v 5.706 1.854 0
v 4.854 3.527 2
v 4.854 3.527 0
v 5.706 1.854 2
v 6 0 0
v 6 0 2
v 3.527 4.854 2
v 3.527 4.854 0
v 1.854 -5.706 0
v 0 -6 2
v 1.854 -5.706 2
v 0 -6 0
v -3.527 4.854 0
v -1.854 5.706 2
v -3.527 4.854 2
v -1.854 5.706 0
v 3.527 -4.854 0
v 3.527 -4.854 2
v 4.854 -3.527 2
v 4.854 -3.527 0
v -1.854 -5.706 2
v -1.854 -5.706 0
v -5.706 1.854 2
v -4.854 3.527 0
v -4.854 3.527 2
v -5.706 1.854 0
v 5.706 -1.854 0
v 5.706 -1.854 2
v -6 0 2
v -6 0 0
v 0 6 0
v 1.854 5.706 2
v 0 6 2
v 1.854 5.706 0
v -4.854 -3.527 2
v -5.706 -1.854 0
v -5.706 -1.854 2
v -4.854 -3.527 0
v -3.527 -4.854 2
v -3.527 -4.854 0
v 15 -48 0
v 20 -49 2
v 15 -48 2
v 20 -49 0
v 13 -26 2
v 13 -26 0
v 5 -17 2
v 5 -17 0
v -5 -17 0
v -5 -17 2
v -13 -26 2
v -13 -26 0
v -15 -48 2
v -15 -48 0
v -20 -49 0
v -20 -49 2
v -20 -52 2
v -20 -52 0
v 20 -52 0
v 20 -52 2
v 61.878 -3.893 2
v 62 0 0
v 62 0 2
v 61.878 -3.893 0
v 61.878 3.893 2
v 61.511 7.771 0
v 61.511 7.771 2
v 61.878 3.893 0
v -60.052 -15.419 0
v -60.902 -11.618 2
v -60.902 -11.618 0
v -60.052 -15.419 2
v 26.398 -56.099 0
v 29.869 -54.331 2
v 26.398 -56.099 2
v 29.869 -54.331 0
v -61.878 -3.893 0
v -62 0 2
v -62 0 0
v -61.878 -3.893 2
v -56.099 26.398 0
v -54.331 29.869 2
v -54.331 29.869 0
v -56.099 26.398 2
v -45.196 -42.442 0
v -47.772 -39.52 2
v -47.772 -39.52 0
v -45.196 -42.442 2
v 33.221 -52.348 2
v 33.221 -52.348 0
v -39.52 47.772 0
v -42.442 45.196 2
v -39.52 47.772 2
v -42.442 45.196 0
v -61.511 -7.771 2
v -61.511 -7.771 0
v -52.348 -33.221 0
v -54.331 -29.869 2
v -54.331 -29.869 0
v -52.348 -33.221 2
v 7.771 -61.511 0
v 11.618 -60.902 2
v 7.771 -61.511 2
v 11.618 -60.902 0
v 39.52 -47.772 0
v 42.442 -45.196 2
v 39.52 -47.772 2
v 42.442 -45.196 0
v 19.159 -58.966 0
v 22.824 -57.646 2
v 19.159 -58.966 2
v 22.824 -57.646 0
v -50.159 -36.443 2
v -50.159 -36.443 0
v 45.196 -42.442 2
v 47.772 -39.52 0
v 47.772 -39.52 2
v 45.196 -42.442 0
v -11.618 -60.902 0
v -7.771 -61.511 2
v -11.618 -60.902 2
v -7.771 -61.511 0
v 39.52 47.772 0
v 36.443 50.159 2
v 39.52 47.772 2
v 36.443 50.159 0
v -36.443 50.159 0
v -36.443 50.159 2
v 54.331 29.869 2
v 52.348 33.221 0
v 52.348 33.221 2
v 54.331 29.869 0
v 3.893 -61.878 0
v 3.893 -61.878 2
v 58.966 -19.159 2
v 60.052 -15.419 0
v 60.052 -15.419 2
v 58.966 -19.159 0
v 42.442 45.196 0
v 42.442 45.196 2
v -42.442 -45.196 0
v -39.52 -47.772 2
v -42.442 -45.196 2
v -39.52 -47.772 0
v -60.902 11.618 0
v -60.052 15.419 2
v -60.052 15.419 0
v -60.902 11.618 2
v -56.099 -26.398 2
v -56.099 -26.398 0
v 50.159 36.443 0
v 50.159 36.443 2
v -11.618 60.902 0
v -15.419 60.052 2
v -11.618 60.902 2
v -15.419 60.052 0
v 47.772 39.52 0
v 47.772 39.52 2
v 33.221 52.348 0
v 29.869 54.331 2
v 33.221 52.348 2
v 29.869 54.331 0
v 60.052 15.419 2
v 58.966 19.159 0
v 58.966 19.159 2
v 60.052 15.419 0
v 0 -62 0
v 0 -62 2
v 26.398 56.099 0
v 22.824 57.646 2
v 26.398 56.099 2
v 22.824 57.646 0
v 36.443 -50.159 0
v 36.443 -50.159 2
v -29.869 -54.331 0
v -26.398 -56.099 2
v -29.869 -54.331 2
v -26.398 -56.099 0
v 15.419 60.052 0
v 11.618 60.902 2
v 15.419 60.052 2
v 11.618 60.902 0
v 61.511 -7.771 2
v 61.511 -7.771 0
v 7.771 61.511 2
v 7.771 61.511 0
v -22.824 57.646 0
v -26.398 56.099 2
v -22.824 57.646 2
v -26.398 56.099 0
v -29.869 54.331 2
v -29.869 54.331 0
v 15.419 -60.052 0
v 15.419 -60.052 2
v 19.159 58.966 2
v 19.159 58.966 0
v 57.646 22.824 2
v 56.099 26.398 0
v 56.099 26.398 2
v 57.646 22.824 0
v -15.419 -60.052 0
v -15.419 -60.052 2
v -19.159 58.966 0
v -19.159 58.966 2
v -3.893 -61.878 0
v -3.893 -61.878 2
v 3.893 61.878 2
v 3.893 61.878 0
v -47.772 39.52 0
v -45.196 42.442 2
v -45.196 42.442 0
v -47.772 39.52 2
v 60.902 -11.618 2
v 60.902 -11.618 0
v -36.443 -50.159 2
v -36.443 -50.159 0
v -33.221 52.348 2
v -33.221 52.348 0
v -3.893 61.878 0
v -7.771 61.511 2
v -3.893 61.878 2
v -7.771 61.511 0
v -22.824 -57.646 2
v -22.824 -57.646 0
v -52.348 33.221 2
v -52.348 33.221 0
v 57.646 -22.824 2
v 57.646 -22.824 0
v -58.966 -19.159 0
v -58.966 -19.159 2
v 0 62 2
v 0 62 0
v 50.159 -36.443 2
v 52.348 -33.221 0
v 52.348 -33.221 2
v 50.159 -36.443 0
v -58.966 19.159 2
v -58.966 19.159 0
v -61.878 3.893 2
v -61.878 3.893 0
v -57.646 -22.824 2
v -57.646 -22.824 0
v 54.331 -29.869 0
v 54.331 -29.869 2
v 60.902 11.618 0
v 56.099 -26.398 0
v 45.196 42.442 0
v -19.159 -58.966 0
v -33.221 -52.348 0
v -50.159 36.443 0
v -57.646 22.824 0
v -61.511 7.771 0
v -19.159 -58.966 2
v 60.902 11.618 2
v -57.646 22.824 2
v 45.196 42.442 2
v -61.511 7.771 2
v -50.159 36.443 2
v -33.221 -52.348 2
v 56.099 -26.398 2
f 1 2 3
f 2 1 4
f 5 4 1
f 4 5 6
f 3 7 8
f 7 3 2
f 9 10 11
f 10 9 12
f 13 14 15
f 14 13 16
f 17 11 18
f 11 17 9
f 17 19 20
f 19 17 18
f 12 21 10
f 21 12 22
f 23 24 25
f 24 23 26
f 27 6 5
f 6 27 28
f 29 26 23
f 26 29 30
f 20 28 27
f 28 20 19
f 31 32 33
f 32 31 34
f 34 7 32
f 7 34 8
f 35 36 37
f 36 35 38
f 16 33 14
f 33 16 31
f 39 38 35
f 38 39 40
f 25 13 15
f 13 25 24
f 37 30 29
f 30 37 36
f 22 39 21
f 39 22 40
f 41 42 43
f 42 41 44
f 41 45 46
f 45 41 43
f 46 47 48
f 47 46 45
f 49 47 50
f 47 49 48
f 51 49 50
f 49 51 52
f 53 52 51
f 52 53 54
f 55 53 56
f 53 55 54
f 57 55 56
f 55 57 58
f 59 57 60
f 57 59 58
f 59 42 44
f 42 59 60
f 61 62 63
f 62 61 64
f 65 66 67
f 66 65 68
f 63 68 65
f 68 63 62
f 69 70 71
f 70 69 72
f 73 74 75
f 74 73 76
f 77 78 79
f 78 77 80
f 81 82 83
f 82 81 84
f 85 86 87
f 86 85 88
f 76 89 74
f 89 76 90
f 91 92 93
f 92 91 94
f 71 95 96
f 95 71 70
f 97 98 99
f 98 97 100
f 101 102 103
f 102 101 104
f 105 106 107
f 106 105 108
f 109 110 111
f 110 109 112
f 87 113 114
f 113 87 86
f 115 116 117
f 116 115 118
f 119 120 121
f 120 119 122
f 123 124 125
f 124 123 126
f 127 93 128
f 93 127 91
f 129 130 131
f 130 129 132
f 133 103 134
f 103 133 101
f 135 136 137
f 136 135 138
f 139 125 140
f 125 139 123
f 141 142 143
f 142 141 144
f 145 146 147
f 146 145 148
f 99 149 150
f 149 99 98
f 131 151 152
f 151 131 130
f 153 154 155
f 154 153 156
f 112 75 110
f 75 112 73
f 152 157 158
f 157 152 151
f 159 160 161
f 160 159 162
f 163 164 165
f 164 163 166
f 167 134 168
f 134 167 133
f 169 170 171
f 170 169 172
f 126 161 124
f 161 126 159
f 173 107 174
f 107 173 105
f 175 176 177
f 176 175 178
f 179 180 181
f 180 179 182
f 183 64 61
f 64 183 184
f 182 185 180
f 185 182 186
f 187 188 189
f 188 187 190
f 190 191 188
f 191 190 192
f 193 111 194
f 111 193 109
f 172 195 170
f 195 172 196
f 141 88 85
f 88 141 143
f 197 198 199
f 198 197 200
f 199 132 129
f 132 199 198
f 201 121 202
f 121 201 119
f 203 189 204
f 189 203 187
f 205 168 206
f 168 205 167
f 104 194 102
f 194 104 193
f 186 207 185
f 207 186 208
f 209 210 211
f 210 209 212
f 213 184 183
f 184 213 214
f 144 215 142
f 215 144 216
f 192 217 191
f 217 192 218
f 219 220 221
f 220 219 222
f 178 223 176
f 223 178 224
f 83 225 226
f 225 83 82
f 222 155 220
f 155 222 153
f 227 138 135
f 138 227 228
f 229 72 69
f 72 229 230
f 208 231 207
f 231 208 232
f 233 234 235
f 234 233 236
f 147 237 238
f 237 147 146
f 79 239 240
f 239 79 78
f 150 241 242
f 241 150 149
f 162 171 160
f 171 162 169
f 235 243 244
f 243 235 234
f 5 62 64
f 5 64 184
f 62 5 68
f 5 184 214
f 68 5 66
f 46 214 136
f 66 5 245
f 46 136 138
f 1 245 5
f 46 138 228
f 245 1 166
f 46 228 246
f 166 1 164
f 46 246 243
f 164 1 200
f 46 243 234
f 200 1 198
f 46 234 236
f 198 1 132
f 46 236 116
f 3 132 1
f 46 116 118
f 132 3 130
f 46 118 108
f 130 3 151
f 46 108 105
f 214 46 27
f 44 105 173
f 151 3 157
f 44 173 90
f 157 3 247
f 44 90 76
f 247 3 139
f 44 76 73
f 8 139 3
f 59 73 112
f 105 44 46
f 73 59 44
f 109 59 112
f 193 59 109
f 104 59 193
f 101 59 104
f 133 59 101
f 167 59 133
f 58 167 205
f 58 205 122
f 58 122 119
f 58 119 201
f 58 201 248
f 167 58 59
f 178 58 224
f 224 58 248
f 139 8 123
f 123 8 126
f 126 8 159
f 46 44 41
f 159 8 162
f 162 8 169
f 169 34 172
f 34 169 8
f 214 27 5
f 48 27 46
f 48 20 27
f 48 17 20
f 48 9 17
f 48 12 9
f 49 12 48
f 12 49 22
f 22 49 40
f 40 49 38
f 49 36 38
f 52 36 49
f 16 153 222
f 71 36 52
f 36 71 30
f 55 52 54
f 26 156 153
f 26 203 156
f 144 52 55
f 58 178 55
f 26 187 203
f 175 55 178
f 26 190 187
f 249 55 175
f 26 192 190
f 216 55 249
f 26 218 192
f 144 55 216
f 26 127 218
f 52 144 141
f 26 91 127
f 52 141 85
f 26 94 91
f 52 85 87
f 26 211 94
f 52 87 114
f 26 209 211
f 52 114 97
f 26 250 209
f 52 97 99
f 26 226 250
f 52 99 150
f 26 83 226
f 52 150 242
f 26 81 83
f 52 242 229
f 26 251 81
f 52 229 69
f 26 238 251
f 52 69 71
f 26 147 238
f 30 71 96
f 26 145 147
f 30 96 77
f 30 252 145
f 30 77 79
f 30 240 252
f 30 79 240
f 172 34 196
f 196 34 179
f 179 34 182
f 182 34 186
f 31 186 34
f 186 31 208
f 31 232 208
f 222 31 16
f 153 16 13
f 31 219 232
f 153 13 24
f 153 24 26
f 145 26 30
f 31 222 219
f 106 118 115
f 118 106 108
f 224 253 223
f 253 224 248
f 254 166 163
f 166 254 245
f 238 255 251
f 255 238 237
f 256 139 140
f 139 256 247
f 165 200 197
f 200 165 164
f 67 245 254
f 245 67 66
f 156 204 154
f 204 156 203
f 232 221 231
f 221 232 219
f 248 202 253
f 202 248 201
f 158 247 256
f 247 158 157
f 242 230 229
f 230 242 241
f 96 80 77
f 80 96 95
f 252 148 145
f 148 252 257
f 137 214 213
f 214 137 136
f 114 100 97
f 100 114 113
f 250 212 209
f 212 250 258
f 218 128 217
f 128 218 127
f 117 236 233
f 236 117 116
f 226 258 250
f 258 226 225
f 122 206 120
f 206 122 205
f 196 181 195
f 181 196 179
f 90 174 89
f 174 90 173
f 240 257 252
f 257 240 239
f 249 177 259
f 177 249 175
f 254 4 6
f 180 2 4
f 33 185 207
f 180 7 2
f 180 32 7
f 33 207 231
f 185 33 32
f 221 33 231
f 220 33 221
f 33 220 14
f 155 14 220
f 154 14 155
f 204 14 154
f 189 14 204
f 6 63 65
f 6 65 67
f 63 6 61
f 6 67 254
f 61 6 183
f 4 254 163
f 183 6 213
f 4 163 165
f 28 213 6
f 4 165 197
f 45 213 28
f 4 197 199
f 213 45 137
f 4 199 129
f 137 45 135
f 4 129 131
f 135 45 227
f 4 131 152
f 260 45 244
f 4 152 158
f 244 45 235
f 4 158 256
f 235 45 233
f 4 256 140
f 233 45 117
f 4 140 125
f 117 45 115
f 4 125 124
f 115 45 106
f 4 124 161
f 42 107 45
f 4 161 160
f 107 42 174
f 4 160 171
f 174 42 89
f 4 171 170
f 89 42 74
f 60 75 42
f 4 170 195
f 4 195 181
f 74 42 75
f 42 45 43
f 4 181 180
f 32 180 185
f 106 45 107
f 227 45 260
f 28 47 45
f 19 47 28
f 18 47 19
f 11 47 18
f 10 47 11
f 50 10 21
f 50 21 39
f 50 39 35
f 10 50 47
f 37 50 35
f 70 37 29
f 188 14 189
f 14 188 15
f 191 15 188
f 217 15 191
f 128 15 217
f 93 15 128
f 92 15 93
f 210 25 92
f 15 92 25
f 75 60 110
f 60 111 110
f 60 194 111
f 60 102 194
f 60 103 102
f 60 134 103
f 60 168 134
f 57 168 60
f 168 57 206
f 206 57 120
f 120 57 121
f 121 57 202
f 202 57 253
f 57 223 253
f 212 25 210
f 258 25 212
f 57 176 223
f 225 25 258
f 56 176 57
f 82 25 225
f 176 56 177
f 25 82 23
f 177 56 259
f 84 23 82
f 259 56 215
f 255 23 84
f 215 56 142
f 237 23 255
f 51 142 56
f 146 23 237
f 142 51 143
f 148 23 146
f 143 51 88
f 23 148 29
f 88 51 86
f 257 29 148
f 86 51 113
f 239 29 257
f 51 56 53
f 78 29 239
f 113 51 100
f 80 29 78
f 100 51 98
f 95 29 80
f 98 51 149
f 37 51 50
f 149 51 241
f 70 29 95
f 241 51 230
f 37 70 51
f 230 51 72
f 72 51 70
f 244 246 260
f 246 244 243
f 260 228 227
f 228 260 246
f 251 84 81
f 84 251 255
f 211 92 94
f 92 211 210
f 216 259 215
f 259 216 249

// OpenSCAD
// file: poddispenser_common.scad
// approximates a capsule 
module capsule_cutout() {
    polygon(points=[[-20,0],[20,0],[20,3],[15,4],[13,26],[5,35],[-5,35],[-13,26],[-15,4],[-20,3]]);
}

// ouline of capsule + 2mm wall
module capsule_cutout_outer() {
    polygon(points=[[-22,-2],[22,-2],[22,5],[17,6],[15,28],[7,37],[1,37],[1,47],[-1,47],[-1,37],[-7,37],[-15,28],[-17,6],[-22,5]]);
}

// inner + outer capsule, open at the end
module capsule_outline_open() {
    polygon(points=[[20,0],[20,3],[15,4],[13,26],[5,35],
                            [-5,35],[-13,26],[-15,4],[-20,3],[-20,-2],
                            [-22,-2],[-22,5],[-17,6],[-15,28],[-7,37],
                            [-1,37],[-1,65],[1,65],[1,37],
                            [7,37],[15,28],[17,6],[22,5],[22,-2],[20,-2]]);
    
    
}
// main file
use <poddispenser_common.scad>

module poddispenser_blockplate (radius=60, wallwidth=2) {
    difference() {
        cylinder($fn=100,r=radius+wallwidth,h=wallwidth);
        union() {
            // axle hole
            translate([0,0,-1]) cylinder($fn=20,r=6, h=2*wallwidth);
            // capsule cutout
            translate([0,-52,-0.01]) linear_extrude(height=10) capsule_cutout();
	}
    }
}

poddispenser_blockplate();
